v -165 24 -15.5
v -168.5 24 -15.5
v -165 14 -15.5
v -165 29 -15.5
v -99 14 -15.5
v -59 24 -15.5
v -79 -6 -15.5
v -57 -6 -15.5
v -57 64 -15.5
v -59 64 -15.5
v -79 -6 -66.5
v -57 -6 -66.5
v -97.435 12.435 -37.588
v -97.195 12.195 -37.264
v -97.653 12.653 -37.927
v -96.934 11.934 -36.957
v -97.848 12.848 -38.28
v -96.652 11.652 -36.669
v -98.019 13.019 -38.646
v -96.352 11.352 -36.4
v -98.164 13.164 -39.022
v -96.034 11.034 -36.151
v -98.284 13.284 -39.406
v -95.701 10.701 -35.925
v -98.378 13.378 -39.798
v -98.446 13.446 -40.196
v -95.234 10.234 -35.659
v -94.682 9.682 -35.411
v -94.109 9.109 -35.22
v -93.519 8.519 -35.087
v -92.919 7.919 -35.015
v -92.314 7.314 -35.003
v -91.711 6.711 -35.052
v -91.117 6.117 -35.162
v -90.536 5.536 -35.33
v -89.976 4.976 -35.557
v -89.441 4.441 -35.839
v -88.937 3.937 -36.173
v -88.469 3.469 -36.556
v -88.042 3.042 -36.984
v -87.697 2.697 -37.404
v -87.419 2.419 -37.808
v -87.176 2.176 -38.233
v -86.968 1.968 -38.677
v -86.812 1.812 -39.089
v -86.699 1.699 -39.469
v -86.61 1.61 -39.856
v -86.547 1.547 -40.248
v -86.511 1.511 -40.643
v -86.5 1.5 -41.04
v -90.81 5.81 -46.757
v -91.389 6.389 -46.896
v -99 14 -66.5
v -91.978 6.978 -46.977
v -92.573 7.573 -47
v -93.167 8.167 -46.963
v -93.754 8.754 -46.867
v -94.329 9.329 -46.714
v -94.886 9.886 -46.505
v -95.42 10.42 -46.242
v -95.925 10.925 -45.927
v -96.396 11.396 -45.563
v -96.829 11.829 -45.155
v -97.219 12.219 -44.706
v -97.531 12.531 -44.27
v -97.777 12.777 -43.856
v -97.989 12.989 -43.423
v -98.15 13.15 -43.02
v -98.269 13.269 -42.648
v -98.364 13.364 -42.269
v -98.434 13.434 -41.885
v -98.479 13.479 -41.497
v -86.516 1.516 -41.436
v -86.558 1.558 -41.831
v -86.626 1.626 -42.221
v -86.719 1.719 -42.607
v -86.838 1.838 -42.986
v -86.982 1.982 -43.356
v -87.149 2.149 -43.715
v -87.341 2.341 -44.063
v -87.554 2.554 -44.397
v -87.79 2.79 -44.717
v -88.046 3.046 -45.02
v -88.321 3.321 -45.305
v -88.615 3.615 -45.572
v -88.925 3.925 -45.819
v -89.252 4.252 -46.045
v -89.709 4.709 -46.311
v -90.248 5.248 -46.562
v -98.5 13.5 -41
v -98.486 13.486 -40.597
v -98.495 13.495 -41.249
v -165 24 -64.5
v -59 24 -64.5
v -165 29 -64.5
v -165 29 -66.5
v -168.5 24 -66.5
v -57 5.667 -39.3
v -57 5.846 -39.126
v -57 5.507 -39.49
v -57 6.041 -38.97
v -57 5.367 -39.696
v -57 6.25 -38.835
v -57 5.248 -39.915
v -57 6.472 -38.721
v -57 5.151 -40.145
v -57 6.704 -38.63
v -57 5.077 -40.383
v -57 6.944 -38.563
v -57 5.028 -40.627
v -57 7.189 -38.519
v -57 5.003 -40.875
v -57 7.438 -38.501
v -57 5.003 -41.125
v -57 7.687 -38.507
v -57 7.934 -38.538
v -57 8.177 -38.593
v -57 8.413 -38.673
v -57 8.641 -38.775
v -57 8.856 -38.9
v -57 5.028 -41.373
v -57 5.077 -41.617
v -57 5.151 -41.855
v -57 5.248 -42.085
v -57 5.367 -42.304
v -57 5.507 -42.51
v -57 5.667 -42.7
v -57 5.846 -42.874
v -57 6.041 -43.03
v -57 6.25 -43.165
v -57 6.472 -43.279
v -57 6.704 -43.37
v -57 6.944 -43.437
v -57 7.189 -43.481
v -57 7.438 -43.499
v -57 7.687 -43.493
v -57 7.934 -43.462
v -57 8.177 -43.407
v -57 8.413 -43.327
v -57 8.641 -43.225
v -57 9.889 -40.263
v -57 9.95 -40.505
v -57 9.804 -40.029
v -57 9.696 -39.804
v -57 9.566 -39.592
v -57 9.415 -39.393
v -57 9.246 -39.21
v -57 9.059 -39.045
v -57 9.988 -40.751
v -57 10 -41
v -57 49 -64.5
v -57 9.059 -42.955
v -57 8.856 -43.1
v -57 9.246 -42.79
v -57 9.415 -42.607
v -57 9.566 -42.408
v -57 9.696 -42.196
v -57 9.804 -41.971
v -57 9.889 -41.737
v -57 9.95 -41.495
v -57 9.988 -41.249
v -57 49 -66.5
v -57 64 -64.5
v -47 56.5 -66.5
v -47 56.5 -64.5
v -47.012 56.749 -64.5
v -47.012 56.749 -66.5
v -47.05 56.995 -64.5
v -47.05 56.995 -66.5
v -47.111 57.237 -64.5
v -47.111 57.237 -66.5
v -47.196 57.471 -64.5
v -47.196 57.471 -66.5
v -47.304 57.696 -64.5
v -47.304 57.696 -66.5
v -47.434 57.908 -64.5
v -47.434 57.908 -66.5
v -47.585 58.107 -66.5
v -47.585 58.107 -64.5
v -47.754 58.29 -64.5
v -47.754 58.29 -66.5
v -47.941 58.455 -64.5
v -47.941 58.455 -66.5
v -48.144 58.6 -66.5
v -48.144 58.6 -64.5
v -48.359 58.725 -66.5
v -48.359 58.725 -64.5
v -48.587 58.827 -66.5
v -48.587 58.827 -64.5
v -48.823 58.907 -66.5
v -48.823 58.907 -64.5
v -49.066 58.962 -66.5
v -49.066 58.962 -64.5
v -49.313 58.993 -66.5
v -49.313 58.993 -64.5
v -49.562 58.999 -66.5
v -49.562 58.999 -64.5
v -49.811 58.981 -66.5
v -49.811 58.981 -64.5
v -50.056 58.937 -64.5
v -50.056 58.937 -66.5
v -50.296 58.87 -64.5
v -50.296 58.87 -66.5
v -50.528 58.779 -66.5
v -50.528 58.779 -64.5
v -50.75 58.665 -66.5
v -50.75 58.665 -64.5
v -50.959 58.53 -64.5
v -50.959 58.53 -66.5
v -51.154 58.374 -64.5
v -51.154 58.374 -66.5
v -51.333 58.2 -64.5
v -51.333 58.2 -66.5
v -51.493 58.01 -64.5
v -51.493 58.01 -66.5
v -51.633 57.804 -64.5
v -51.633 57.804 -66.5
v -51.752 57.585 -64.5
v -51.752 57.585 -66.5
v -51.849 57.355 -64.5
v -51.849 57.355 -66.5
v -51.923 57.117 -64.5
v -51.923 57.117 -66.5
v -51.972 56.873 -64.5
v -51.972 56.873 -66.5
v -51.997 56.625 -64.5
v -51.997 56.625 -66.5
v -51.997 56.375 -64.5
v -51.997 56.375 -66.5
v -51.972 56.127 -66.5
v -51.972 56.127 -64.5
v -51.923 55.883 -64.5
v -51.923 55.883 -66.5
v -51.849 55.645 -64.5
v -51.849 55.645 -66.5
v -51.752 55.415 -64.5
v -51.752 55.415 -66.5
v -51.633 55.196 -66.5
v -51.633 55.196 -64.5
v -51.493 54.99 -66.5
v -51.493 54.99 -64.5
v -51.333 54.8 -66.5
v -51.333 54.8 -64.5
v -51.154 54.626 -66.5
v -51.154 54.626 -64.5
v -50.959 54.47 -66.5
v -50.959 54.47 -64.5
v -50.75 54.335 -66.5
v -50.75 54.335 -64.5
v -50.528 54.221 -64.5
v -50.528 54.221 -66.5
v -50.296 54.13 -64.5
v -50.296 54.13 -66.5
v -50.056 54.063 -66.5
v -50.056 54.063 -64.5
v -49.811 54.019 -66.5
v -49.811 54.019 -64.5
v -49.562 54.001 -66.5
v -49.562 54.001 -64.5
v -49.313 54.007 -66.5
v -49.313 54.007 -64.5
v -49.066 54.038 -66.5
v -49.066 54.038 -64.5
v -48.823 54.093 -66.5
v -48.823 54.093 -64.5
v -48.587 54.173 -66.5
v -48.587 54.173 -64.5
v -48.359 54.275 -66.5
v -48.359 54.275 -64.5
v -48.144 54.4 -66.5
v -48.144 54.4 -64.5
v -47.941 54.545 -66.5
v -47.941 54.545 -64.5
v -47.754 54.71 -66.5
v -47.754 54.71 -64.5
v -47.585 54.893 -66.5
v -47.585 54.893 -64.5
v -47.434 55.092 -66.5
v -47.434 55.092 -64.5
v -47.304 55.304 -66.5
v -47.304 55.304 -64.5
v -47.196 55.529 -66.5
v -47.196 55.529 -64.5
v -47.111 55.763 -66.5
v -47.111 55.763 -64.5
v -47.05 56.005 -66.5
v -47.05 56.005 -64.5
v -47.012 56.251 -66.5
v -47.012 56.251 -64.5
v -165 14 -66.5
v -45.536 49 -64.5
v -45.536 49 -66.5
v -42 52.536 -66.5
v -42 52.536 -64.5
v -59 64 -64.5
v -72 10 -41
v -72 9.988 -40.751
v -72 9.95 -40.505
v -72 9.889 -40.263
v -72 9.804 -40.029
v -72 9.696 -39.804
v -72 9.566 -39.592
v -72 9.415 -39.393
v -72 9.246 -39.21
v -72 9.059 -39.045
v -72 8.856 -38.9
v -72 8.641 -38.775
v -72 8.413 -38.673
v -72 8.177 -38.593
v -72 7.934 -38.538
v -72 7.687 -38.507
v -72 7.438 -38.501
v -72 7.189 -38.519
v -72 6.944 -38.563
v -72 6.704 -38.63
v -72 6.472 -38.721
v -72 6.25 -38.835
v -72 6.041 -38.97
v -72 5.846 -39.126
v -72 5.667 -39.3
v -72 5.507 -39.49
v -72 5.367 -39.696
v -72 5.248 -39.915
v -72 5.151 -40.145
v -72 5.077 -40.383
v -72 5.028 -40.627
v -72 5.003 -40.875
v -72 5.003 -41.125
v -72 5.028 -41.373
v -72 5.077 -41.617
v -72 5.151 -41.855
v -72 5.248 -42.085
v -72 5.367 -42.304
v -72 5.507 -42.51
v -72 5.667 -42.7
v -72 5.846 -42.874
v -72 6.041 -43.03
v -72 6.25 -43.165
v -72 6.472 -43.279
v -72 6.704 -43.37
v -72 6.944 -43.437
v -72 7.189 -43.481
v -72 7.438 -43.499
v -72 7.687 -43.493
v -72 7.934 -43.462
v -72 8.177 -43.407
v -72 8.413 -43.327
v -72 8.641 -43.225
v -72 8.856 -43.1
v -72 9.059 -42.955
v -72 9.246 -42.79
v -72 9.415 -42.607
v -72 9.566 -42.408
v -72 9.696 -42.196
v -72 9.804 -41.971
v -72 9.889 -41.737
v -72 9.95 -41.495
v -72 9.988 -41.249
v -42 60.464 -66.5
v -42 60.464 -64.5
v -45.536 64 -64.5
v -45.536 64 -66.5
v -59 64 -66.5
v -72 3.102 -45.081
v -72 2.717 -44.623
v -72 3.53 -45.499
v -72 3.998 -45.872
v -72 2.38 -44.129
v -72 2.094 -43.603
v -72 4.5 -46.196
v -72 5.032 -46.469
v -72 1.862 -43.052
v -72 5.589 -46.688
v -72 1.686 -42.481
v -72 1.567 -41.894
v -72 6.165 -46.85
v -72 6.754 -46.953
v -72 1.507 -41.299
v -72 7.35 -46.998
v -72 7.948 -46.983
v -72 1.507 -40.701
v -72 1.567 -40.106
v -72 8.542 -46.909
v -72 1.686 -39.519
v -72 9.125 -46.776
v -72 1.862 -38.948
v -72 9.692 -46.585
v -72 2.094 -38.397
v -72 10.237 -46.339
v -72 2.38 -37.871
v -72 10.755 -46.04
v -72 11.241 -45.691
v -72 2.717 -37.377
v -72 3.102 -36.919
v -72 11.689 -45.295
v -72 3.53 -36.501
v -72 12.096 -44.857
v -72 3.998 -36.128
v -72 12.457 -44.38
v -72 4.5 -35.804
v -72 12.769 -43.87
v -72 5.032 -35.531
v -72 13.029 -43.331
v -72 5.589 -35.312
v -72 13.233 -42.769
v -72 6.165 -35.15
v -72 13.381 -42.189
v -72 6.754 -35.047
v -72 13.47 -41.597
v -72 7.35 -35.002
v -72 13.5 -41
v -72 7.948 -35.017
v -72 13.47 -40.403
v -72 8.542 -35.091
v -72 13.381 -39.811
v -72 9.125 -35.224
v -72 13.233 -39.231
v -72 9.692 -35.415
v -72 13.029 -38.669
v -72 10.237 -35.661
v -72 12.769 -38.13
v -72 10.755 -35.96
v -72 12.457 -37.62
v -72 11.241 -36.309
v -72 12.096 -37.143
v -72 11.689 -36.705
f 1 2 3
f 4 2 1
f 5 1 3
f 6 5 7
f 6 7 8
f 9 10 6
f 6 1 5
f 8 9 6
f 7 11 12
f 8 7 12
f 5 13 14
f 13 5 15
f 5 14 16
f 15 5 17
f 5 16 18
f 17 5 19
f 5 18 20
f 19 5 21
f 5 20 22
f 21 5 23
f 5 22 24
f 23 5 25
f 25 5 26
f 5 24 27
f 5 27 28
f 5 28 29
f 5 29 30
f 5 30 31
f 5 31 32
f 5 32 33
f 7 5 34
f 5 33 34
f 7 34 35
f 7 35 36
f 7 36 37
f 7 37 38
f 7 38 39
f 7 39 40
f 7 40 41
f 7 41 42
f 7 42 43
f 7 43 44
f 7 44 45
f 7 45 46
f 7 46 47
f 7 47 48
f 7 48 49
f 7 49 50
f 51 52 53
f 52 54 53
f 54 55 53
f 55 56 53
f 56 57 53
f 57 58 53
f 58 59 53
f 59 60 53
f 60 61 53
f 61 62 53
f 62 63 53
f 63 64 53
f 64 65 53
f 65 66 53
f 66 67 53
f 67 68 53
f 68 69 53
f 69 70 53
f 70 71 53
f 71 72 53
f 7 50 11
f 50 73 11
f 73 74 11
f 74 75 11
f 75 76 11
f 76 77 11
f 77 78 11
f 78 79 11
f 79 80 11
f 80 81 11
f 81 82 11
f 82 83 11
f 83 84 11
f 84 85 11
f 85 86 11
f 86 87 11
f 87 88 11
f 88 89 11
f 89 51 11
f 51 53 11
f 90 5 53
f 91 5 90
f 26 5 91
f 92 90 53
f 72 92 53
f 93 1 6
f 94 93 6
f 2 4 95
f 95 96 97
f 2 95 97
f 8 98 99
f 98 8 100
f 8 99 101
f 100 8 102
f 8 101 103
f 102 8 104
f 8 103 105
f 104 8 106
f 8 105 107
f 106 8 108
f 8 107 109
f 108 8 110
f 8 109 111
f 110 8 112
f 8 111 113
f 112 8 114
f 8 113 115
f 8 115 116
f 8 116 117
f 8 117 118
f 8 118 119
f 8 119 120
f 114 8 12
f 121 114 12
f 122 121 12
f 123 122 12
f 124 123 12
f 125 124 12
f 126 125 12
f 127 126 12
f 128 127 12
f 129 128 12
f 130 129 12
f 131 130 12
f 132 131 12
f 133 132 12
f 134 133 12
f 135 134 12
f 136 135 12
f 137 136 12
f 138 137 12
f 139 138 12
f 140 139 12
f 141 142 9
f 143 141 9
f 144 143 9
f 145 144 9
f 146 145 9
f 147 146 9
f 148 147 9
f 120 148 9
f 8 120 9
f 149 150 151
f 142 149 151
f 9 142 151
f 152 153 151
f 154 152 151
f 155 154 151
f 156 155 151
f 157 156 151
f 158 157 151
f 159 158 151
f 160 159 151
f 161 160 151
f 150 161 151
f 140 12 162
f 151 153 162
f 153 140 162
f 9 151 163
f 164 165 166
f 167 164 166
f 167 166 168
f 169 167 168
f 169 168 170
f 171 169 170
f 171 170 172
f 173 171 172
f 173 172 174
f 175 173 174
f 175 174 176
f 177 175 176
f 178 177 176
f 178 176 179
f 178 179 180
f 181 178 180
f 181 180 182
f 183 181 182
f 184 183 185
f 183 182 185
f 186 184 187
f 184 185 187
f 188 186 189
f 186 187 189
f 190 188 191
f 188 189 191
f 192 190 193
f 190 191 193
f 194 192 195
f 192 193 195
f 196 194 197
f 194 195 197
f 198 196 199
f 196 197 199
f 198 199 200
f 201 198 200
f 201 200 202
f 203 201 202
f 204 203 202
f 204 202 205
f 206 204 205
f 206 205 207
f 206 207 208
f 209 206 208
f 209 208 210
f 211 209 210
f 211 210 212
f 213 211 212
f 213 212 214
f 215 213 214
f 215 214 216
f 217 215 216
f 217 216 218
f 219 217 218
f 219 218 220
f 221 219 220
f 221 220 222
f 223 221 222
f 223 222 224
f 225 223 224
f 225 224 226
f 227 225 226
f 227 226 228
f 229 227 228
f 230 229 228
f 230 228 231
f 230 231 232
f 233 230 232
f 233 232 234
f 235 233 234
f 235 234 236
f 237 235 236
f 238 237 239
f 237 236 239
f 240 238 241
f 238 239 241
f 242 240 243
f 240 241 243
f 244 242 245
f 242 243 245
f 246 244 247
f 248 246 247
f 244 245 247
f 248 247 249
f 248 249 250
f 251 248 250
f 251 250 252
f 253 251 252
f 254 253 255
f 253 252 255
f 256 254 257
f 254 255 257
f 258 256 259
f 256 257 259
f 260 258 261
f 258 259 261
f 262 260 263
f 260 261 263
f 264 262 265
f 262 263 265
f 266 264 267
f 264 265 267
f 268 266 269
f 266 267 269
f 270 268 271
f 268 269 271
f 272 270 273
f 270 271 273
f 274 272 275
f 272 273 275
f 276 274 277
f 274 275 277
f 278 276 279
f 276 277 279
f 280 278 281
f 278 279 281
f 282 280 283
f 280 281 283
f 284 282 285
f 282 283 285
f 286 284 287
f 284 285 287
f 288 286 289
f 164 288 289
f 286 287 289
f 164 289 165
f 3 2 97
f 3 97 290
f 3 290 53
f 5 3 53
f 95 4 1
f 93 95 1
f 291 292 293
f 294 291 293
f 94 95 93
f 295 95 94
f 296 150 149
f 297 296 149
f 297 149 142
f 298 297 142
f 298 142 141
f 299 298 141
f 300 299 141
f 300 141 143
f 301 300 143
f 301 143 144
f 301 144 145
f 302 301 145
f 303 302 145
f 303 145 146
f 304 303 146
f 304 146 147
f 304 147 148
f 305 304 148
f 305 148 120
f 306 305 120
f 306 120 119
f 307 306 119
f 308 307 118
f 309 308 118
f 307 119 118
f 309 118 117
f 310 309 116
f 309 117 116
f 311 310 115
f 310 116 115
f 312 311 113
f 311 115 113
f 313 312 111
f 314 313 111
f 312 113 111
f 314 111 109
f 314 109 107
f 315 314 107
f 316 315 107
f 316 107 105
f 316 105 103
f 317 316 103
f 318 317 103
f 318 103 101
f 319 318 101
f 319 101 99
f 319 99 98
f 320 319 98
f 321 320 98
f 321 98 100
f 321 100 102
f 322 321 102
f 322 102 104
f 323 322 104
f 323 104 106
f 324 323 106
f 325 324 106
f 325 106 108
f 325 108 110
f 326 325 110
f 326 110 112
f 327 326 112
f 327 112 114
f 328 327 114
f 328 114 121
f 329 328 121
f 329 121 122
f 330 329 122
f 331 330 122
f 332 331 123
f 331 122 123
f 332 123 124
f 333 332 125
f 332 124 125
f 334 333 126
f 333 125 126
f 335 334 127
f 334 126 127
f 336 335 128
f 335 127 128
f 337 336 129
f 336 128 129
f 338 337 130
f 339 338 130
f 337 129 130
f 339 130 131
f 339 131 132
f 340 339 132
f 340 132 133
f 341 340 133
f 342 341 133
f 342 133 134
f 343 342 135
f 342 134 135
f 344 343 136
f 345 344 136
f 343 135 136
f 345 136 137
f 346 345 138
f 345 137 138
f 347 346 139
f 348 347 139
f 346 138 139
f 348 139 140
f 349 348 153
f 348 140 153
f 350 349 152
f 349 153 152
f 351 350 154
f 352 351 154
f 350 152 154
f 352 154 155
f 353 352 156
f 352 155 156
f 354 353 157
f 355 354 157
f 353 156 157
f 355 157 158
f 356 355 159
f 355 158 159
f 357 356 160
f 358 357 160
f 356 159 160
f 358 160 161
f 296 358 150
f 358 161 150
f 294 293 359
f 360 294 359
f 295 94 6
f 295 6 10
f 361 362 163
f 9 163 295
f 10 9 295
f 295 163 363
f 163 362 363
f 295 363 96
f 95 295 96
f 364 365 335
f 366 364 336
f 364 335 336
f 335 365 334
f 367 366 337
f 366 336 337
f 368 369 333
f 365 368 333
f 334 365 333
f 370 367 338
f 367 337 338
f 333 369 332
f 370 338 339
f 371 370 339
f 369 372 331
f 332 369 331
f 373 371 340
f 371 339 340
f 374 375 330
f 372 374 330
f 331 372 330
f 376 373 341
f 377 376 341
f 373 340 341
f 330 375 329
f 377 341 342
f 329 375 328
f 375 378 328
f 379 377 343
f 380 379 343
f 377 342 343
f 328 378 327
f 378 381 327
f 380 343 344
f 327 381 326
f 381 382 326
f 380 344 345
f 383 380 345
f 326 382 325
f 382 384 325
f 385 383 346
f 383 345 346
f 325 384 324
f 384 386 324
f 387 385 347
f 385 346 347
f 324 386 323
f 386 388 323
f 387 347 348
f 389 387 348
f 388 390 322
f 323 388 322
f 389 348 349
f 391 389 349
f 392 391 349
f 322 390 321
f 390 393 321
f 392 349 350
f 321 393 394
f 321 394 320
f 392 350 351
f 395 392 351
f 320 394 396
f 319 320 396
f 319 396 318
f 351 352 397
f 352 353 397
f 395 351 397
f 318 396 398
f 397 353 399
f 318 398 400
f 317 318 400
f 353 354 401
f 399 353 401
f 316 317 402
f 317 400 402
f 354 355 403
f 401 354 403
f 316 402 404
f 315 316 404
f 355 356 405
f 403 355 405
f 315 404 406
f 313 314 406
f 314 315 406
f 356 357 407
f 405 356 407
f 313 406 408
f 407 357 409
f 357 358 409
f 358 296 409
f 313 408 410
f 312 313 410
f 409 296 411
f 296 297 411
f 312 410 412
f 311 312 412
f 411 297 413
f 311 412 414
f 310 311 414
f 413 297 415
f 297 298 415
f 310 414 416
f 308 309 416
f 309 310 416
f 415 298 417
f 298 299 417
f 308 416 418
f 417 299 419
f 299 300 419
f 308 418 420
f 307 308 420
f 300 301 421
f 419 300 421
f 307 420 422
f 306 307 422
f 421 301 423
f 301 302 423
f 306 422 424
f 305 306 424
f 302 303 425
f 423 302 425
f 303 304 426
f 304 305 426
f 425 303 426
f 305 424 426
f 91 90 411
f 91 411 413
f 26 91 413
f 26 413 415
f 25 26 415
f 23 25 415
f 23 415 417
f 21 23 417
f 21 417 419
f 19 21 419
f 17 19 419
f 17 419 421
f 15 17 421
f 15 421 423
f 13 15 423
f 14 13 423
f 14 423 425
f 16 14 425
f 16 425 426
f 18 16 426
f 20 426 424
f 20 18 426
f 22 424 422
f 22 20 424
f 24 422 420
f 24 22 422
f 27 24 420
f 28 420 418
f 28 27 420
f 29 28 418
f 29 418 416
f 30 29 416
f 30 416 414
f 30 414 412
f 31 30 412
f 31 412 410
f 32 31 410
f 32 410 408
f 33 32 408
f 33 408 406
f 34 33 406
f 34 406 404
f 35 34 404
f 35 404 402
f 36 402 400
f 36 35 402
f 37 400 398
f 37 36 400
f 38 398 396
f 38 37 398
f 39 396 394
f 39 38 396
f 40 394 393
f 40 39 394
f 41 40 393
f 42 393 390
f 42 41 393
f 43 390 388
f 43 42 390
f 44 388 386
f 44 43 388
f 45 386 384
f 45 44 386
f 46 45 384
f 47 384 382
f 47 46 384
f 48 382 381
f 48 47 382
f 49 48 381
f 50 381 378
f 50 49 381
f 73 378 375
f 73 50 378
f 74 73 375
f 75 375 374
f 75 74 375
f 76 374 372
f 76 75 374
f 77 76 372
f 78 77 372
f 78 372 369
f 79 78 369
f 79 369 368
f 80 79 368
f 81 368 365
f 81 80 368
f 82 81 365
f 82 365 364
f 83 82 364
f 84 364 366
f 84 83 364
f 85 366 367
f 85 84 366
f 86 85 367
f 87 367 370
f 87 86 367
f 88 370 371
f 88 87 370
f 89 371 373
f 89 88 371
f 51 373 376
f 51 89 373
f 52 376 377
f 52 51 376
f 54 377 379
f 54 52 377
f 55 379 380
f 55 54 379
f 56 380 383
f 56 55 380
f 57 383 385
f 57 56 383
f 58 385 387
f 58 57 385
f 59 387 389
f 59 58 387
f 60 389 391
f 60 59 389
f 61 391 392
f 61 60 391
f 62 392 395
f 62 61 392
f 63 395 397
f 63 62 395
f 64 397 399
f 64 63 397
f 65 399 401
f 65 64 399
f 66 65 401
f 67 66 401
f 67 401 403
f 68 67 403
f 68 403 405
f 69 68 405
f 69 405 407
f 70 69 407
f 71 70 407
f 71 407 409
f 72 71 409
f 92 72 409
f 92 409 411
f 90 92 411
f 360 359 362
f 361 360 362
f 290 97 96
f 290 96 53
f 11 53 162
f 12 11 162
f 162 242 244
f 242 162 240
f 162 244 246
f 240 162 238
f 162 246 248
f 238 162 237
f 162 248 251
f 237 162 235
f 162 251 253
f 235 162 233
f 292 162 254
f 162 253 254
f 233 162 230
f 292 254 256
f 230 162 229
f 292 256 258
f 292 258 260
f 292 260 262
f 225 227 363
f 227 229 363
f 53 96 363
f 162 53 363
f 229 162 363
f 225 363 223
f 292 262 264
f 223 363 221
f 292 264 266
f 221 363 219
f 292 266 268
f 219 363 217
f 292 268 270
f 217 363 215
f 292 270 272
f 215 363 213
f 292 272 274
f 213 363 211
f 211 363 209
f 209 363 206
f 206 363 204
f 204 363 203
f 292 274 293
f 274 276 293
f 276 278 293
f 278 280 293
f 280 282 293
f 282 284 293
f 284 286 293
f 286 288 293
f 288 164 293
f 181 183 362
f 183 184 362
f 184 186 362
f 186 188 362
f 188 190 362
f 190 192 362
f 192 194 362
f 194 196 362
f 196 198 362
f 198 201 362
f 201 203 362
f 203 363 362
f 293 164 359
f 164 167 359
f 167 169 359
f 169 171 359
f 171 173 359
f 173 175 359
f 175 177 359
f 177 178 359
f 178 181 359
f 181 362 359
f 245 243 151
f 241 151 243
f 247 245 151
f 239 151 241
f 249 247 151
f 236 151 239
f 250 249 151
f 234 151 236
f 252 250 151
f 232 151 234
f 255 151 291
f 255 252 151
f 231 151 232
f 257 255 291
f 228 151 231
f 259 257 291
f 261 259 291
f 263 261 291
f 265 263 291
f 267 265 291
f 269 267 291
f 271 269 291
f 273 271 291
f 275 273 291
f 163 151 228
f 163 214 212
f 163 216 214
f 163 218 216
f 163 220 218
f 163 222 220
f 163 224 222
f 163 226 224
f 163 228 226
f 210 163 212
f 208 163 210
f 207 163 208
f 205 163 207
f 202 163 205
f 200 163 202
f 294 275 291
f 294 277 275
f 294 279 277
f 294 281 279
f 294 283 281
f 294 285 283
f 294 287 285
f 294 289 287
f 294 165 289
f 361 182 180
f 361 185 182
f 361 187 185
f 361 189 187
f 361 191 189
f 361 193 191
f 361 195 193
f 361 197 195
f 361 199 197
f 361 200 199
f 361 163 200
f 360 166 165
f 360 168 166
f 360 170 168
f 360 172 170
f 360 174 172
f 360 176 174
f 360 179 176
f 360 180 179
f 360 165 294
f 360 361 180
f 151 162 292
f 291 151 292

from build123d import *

# Parameters (mm, degrees)
PAD004_DEPTH    = 51
POCKET008_DEPTH = 49
SKETCH014_R     = 2.5
POCKET009_DEPTH = 111.501
SKETCH015_R     = 6
POCKET010_DEPTH = 27
PAD005_DEPTH    = 2
SKETCH017_R     = 2.5
POCKET011_DEPTH = 5


with BuildPart() as part:
    # Sketch012 → Pad004 (new body)
    with BuildSketch(Plane.XY):
        Polygon((40, 50), (-66, 15), (-69.5, 10), (-66, 0), (0, 0), (20, -20), (42, -20), (42, 50), align=None)
    extrude(amount=PAD004_DEPTH)

    # Sketch013 (on Face10 of Pad004) → Pocket008 (cut)
    with BuildSketch(Plane.XY.offset(51)):
        Polygon((40, 50), (-66, 15), (-66, 10), (40, 10), align=None)
    extrude(amount=-POCKET008_DEPTH, mode=Mode.SUBTRACT)

    # Sketch014 (on Face10 of Pocket008) → Pocket009 (cut, through all)
    with BuildSketch(Plane.YZ.offset(42)):
        with Locations((-6.5, 25.5)):
            Circle(SKETCH014_R)
    extrude(amount=-POCKET009_DEPTH, mode=Mode.SUBTRACT)

    # Sketch015 → Pocket010 (cut)
    with BuildSketch(Plane.YZ):
        with Locations((-6.5, 25.5)):
            Circle(SKETCH015_R)
    extrude(amount=POCKET010_DEPTH, mode=Mode.SUBTRACT)

    # Sketch016 → Pad005 (join)
    with BuildSketch(Plane.XY):
        Polygon((53.464466, 50), (42, 50), (42, 35), (53.464466, 35), (57, 38.535534), (57, 46.464466), align=None)
    extrude(amount=PAD005_DEPTH)

    # Sketch017 (on Face19 of Pad005) → Pocket011 (cut)
    with BuildSketch(Plane.XY.offset(2)):
        with Locations((49.5, 42.5)):
            Circle(SKETCH017_R)
    extrude(amount=-POCKET011_DEPTH, mode=Mode.SUBTRACT)


with BuildPart() as part_1:
    # Body001 placement: moved
    add(part.part.moved(Location((-99, 14, -66.5))))


solid = part_1.part
